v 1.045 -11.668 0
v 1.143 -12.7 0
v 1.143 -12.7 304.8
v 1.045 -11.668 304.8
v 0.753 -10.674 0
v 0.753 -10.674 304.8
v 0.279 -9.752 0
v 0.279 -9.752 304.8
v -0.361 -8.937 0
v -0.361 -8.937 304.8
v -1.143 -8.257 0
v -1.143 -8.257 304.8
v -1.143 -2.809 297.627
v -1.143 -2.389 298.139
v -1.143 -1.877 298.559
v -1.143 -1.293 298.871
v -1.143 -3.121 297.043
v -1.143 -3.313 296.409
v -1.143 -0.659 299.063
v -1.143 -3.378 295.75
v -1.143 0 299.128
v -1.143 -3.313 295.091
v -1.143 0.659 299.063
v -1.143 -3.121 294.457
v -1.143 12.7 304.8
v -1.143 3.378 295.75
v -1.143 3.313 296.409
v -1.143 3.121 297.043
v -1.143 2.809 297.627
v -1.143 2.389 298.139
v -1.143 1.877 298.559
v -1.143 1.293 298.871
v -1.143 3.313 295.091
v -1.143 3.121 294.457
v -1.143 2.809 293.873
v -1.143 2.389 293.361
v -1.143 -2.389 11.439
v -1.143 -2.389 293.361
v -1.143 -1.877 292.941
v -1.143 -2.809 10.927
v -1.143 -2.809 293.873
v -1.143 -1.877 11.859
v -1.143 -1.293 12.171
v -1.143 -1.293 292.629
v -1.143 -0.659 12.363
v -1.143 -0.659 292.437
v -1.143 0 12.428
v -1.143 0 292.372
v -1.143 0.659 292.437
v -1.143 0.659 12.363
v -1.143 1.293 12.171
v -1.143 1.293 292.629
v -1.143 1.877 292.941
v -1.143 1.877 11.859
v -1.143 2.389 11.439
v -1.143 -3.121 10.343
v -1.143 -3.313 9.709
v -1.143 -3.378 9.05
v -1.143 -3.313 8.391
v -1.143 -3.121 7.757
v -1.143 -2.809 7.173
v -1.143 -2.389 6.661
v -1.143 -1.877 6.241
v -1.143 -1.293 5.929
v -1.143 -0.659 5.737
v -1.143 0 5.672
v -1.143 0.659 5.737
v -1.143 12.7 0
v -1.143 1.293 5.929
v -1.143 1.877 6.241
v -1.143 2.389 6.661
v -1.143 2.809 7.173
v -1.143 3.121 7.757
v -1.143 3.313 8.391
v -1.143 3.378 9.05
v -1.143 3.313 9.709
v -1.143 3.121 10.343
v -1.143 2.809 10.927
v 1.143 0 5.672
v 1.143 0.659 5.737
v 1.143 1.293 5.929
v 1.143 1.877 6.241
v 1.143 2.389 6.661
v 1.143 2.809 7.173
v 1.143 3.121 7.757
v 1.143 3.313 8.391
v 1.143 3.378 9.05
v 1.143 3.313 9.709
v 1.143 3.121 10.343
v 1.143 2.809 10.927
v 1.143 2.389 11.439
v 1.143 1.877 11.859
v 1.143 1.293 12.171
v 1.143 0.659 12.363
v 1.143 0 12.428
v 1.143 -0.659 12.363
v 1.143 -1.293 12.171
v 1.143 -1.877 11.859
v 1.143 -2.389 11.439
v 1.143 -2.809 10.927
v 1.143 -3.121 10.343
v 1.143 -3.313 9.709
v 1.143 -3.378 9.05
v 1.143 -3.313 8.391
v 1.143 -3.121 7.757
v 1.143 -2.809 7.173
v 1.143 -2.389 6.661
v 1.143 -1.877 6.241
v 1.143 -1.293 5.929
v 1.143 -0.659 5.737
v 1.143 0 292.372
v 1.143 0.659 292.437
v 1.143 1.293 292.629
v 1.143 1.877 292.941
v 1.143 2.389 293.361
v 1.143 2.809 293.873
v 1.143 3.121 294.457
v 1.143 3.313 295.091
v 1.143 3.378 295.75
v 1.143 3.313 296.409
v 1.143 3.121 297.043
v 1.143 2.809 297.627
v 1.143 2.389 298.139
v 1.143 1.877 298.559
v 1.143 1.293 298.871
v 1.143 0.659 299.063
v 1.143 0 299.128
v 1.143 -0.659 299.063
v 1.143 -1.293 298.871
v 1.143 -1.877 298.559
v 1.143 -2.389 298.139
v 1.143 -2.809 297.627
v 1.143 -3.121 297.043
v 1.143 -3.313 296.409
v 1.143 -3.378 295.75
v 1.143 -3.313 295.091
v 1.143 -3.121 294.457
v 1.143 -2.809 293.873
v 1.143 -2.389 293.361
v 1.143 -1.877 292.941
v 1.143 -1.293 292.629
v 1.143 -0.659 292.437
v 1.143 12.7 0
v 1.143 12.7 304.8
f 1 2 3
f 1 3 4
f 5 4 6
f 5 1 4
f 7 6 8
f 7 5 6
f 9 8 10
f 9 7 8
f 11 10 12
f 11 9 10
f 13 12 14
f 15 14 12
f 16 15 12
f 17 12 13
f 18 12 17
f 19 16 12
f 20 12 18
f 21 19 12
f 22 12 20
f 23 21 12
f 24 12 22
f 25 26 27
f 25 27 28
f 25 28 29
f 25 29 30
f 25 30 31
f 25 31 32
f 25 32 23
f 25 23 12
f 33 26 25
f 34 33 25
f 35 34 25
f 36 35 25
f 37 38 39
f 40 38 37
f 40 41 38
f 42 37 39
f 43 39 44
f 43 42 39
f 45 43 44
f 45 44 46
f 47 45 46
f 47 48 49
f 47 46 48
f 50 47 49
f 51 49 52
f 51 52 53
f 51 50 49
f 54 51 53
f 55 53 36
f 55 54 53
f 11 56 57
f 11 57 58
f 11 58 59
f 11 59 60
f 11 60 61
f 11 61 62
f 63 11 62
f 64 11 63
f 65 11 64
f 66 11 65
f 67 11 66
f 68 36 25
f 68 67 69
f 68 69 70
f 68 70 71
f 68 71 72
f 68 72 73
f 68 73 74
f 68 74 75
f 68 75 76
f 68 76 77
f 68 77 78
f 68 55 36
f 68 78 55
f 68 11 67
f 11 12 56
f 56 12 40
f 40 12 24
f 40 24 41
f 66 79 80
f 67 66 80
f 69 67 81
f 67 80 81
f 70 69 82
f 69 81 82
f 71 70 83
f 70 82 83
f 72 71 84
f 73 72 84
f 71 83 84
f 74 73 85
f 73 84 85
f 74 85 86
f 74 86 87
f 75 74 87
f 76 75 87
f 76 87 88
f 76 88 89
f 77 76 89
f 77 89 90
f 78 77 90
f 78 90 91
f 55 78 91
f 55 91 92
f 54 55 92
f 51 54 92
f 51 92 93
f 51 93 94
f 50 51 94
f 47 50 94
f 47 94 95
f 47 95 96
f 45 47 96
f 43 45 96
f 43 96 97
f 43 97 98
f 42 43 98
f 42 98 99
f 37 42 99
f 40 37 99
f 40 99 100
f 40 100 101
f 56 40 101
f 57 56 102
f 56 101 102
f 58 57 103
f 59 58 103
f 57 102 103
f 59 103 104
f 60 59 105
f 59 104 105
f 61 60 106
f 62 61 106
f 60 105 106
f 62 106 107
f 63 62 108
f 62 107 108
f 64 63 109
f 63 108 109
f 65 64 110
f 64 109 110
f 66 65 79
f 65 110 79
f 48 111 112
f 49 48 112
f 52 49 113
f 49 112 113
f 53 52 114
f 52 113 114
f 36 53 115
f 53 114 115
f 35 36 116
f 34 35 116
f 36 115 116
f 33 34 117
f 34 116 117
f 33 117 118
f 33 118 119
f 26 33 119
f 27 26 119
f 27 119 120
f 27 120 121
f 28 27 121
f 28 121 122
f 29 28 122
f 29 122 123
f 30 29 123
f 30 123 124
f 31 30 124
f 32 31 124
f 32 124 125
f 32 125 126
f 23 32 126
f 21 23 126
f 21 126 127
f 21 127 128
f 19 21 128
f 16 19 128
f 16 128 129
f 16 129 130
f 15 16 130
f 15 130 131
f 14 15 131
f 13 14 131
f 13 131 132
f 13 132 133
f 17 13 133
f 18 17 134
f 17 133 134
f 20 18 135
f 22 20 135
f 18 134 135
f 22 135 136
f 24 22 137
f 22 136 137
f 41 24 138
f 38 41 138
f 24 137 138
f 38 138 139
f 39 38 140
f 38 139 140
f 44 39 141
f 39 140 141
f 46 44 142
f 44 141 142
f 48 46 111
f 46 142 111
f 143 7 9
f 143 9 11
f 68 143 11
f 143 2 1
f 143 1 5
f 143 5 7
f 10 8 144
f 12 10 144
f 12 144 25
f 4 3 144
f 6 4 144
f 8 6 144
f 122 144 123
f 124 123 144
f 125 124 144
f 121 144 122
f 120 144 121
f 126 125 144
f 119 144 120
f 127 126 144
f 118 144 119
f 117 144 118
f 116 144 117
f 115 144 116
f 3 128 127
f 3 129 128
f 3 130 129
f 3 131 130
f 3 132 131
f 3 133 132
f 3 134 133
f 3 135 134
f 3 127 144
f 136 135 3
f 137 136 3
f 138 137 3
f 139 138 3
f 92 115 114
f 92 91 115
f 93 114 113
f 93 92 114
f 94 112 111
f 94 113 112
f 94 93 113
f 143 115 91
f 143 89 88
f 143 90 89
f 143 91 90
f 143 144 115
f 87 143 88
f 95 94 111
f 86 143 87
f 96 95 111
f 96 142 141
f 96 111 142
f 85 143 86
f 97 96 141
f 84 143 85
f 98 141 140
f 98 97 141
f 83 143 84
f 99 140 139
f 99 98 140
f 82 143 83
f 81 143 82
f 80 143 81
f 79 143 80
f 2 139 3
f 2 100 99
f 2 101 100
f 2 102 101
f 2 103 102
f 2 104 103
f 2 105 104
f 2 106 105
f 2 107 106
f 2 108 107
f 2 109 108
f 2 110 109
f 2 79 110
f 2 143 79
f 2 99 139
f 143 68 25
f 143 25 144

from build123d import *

# Parameters (mm, degrees)
BOSS_EXTRUDE2_DEPTH     = 304.8
F_1_4_CLEARANCE_HOLE2_D = 6.7564


with BuildPart() as part:
    # Sketch1 → Boss-Extrude2 (new body)
    with BuildSketch(Plane.XY):
        with BuildLine():
            Line((-1.143, -8.256814656), (-1.143, 12.7))
            Line((-1.143, 12.7), (1.143, 12.7))
            Line((1.143, 12.7), (1.143, -12.7))
            ThreePointArc((1.143, -12.7), (0.537985791, -10.201615922), (-1.143, -8.256814656))
        make_face()
    extrude(amount=BOSS_EXTRUDE2_DEPTH)

    # 1/4 Clearance Hole2 (through all)
    with Locations(Plane.ZY.offset(1.143)):
        with Locations((9.050000188, 0), (295.749999812, 0)):
            Hole(F_1_4_CLEARANCE_HOLE2_D / 2)


solid = part.part
